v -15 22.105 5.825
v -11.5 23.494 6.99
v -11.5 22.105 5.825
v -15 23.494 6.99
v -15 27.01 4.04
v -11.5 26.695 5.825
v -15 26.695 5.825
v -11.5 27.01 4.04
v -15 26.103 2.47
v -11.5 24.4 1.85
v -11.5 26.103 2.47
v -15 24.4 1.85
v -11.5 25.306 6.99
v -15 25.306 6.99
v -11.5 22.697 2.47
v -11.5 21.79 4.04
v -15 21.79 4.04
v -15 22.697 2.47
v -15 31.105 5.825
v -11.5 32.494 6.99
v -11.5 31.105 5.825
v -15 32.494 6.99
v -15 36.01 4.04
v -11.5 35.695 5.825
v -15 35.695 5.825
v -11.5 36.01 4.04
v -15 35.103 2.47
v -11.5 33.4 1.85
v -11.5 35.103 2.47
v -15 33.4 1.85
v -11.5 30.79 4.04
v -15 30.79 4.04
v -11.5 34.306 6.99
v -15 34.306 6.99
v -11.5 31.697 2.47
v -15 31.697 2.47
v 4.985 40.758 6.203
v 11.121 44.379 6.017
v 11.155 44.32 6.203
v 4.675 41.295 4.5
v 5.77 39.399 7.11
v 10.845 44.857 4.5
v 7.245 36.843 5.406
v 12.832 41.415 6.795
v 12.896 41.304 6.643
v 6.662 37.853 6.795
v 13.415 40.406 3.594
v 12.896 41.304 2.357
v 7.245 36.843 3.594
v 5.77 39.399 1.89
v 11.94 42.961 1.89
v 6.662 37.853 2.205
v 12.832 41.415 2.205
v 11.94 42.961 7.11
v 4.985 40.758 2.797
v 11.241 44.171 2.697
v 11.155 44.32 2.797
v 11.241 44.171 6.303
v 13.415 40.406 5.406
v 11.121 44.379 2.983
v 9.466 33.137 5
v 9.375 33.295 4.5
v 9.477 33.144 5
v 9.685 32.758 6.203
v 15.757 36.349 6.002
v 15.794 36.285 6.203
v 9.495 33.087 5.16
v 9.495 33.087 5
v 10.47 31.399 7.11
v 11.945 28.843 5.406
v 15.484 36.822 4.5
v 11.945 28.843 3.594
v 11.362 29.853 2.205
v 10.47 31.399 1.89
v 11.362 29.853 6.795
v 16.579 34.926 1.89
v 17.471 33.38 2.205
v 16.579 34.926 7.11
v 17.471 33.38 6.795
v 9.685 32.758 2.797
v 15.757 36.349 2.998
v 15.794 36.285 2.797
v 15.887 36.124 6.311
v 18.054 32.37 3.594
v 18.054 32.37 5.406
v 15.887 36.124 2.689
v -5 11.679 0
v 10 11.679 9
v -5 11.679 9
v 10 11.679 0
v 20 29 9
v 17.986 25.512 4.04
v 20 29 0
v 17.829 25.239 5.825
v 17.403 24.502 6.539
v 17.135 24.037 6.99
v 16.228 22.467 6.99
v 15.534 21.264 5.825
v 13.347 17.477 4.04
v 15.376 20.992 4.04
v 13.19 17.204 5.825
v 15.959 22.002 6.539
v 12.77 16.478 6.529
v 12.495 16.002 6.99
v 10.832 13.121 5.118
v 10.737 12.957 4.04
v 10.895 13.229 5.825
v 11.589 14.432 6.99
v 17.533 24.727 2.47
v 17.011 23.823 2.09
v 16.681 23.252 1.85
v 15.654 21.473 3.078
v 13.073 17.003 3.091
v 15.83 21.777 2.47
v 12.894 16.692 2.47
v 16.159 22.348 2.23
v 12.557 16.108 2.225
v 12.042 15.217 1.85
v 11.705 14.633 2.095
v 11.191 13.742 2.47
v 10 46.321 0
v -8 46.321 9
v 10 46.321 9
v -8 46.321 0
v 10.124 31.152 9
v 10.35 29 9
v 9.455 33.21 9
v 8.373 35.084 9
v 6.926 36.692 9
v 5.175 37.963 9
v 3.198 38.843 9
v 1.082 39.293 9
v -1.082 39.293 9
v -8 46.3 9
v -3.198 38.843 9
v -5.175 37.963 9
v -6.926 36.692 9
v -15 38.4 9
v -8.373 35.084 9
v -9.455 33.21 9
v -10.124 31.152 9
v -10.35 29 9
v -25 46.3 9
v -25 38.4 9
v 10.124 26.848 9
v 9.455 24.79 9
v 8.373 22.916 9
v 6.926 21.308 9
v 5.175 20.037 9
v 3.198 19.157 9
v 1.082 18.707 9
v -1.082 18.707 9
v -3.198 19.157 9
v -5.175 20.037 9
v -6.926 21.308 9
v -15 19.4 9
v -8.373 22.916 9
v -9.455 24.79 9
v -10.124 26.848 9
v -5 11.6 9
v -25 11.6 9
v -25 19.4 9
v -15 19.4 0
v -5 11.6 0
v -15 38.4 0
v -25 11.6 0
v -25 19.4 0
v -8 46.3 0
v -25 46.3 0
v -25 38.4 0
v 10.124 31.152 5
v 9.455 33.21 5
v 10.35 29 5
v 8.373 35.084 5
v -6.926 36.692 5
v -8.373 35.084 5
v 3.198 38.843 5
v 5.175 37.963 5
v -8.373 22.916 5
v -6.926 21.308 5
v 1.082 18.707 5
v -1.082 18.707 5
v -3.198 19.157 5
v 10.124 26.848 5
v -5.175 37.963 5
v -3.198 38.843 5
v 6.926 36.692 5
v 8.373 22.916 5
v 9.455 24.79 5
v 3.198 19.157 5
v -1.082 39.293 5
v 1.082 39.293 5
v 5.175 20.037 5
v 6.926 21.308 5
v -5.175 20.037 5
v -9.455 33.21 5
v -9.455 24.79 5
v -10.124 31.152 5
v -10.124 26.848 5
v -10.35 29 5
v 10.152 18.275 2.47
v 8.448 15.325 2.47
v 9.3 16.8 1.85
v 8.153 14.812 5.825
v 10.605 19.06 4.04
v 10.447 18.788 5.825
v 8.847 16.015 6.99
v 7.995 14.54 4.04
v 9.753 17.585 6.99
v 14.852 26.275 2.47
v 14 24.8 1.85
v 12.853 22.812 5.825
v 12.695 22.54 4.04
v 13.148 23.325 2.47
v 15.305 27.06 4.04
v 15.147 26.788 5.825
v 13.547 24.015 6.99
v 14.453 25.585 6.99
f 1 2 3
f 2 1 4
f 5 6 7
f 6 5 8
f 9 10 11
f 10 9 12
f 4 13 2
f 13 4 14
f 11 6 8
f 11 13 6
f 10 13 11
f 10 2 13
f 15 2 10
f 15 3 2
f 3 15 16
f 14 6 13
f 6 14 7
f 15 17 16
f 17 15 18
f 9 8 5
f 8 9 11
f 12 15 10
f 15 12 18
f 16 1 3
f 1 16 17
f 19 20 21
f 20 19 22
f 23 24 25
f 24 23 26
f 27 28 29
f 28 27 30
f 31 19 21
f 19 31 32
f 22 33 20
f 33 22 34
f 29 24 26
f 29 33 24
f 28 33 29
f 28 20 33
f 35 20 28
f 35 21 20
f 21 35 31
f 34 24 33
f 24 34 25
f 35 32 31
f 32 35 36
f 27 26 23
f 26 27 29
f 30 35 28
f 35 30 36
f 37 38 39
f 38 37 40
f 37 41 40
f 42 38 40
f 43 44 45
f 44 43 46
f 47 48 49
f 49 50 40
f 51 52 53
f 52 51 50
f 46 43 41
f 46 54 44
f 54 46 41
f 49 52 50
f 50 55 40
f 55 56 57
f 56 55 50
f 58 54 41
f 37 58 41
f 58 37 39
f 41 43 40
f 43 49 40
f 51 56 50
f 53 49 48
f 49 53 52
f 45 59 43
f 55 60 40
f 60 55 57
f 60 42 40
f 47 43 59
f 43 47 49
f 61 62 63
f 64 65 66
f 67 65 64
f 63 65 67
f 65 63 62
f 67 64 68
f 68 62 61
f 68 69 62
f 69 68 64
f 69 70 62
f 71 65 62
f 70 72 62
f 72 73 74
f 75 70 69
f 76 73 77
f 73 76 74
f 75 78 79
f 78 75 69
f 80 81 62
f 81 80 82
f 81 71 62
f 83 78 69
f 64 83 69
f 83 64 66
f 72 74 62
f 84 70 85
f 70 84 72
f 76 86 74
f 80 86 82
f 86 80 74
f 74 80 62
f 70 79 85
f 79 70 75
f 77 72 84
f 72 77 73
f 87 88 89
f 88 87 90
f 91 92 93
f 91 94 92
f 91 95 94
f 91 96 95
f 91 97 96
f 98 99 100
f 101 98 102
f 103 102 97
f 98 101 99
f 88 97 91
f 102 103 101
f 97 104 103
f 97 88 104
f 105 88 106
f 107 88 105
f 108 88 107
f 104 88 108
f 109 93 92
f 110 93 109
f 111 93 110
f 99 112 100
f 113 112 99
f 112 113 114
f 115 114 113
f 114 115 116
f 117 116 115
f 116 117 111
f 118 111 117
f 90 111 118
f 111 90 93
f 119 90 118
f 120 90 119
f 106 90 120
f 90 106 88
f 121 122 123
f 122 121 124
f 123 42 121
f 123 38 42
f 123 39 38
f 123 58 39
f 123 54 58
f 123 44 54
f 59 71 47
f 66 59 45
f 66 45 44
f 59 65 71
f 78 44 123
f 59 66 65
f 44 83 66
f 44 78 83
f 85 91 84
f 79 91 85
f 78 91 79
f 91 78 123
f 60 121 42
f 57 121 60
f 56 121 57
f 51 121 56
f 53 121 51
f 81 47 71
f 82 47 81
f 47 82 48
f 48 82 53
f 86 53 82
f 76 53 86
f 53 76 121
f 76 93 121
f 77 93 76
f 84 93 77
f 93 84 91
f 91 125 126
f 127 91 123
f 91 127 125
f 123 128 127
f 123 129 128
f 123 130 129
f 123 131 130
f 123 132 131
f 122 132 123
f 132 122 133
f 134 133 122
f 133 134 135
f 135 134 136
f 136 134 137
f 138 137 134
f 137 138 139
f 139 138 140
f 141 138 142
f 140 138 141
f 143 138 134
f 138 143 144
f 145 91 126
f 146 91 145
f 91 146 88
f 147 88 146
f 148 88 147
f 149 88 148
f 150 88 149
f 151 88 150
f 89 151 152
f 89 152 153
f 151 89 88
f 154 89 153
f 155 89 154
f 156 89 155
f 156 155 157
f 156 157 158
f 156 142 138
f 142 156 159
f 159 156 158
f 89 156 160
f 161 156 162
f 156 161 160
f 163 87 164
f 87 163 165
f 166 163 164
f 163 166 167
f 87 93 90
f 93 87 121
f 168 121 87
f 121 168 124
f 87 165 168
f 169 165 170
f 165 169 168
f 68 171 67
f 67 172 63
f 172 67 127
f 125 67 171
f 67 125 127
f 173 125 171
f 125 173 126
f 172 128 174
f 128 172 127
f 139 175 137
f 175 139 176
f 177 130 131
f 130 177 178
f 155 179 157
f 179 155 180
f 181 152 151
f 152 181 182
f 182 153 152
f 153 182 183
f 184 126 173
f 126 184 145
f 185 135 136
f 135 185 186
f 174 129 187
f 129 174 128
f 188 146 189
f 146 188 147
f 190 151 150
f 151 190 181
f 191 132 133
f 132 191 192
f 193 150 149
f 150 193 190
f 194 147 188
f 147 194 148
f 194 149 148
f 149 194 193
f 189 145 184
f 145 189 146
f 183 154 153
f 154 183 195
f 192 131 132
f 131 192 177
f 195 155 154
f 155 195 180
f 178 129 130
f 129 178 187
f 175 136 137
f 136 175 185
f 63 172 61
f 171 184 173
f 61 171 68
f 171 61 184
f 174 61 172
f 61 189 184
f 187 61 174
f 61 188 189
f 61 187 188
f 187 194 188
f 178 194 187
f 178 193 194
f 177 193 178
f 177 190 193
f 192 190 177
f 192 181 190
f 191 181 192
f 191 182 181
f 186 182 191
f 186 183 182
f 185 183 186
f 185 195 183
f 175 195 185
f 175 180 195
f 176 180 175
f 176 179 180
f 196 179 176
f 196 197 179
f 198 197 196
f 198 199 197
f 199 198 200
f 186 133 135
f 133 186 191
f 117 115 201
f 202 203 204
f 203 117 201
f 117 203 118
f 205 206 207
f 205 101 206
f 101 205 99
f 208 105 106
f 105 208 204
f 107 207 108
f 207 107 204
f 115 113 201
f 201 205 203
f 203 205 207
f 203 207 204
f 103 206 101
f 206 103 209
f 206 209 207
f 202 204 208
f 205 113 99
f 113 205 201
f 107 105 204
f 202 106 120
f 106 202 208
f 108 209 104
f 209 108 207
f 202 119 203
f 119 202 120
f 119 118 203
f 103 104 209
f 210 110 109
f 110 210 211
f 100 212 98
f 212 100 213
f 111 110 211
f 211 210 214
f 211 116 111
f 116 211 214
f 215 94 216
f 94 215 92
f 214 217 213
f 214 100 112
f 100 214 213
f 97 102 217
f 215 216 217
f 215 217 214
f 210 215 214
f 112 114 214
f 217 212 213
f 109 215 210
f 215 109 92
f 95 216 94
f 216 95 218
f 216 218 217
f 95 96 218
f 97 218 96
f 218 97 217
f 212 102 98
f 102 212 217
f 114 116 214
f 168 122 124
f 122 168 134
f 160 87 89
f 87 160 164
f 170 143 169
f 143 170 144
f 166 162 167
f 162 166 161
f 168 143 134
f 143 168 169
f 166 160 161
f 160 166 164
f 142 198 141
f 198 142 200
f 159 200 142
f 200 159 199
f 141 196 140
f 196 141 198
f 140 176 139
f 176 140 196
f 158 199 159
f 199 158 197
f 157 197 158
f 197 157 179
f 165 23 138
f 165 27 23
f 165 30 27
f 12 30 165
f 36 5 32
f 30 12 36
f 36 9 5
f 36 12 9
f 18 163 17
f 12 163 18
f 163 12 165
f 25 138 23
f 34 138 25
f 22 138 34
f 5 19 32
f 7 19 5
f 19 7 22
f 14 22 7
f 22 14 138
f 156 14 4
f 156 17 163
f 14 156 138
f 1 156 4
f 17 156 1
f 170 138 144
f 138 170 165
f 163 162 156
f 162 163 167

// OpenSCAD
z=9; //высота
g=3.5; //глубина дырок 
//дексибироза
translate ([0,79,0]) {
difference () {
translate([0,-50,0])cylinder(z,20,20, $fn=6);
translate ([0,-50,5])cylinder(4.2,10.35,10.35);
translate ([-7,0,1]) {
rotate([0, 90, 0]) translate([-3.5,-54.6,-17+g]) cylinder(9,2.65,2.65);        
rotate([0, 90, 0]) translate([-3.5,-45.6,-17+g]) cylinder(9,2.65,2.65);          
}  
translate ([9.3,-62.2,4.5])rotate([0,90,-30])cylinder (4.5+g,2.65,2.65);
translate ([14,-54.2,4.5])rotate([0,90,-30])cylinder (4.5+g,2.65,2.65);
translate ([-28,-73,-1])cube ([20,45,11]);

translate ([2,-80,1]) {
translate ([4,40,g])rotate ([90,0,120])cylinder(4.5+g,2.65,2.65);   
translate ([4+4.7,37.5+-9+g,g])rotate ([90,0,120])cylinder(4.5+3.5,2.65,2.65); 
  }  
 }
difference () {
translate ([-25,-67.4,0])cube ([20,34.7,z]);
translate ([0,-50,5])cylinder(4.2,10.35,10.35);
translate ([-7,0,1]) {
rotate([0, 90, 0]) translate([-3.5,-54.6,-17+g]) cylinder(9,2.65,2.65);        
rotate([0, 90, 0]) translate([-3.5,-45.6,-17+g]) cylinder(9,2.65,2.65);          
}  

translate ([-35,-59.6,-1])cube ([20,19,12]);
 }
}
